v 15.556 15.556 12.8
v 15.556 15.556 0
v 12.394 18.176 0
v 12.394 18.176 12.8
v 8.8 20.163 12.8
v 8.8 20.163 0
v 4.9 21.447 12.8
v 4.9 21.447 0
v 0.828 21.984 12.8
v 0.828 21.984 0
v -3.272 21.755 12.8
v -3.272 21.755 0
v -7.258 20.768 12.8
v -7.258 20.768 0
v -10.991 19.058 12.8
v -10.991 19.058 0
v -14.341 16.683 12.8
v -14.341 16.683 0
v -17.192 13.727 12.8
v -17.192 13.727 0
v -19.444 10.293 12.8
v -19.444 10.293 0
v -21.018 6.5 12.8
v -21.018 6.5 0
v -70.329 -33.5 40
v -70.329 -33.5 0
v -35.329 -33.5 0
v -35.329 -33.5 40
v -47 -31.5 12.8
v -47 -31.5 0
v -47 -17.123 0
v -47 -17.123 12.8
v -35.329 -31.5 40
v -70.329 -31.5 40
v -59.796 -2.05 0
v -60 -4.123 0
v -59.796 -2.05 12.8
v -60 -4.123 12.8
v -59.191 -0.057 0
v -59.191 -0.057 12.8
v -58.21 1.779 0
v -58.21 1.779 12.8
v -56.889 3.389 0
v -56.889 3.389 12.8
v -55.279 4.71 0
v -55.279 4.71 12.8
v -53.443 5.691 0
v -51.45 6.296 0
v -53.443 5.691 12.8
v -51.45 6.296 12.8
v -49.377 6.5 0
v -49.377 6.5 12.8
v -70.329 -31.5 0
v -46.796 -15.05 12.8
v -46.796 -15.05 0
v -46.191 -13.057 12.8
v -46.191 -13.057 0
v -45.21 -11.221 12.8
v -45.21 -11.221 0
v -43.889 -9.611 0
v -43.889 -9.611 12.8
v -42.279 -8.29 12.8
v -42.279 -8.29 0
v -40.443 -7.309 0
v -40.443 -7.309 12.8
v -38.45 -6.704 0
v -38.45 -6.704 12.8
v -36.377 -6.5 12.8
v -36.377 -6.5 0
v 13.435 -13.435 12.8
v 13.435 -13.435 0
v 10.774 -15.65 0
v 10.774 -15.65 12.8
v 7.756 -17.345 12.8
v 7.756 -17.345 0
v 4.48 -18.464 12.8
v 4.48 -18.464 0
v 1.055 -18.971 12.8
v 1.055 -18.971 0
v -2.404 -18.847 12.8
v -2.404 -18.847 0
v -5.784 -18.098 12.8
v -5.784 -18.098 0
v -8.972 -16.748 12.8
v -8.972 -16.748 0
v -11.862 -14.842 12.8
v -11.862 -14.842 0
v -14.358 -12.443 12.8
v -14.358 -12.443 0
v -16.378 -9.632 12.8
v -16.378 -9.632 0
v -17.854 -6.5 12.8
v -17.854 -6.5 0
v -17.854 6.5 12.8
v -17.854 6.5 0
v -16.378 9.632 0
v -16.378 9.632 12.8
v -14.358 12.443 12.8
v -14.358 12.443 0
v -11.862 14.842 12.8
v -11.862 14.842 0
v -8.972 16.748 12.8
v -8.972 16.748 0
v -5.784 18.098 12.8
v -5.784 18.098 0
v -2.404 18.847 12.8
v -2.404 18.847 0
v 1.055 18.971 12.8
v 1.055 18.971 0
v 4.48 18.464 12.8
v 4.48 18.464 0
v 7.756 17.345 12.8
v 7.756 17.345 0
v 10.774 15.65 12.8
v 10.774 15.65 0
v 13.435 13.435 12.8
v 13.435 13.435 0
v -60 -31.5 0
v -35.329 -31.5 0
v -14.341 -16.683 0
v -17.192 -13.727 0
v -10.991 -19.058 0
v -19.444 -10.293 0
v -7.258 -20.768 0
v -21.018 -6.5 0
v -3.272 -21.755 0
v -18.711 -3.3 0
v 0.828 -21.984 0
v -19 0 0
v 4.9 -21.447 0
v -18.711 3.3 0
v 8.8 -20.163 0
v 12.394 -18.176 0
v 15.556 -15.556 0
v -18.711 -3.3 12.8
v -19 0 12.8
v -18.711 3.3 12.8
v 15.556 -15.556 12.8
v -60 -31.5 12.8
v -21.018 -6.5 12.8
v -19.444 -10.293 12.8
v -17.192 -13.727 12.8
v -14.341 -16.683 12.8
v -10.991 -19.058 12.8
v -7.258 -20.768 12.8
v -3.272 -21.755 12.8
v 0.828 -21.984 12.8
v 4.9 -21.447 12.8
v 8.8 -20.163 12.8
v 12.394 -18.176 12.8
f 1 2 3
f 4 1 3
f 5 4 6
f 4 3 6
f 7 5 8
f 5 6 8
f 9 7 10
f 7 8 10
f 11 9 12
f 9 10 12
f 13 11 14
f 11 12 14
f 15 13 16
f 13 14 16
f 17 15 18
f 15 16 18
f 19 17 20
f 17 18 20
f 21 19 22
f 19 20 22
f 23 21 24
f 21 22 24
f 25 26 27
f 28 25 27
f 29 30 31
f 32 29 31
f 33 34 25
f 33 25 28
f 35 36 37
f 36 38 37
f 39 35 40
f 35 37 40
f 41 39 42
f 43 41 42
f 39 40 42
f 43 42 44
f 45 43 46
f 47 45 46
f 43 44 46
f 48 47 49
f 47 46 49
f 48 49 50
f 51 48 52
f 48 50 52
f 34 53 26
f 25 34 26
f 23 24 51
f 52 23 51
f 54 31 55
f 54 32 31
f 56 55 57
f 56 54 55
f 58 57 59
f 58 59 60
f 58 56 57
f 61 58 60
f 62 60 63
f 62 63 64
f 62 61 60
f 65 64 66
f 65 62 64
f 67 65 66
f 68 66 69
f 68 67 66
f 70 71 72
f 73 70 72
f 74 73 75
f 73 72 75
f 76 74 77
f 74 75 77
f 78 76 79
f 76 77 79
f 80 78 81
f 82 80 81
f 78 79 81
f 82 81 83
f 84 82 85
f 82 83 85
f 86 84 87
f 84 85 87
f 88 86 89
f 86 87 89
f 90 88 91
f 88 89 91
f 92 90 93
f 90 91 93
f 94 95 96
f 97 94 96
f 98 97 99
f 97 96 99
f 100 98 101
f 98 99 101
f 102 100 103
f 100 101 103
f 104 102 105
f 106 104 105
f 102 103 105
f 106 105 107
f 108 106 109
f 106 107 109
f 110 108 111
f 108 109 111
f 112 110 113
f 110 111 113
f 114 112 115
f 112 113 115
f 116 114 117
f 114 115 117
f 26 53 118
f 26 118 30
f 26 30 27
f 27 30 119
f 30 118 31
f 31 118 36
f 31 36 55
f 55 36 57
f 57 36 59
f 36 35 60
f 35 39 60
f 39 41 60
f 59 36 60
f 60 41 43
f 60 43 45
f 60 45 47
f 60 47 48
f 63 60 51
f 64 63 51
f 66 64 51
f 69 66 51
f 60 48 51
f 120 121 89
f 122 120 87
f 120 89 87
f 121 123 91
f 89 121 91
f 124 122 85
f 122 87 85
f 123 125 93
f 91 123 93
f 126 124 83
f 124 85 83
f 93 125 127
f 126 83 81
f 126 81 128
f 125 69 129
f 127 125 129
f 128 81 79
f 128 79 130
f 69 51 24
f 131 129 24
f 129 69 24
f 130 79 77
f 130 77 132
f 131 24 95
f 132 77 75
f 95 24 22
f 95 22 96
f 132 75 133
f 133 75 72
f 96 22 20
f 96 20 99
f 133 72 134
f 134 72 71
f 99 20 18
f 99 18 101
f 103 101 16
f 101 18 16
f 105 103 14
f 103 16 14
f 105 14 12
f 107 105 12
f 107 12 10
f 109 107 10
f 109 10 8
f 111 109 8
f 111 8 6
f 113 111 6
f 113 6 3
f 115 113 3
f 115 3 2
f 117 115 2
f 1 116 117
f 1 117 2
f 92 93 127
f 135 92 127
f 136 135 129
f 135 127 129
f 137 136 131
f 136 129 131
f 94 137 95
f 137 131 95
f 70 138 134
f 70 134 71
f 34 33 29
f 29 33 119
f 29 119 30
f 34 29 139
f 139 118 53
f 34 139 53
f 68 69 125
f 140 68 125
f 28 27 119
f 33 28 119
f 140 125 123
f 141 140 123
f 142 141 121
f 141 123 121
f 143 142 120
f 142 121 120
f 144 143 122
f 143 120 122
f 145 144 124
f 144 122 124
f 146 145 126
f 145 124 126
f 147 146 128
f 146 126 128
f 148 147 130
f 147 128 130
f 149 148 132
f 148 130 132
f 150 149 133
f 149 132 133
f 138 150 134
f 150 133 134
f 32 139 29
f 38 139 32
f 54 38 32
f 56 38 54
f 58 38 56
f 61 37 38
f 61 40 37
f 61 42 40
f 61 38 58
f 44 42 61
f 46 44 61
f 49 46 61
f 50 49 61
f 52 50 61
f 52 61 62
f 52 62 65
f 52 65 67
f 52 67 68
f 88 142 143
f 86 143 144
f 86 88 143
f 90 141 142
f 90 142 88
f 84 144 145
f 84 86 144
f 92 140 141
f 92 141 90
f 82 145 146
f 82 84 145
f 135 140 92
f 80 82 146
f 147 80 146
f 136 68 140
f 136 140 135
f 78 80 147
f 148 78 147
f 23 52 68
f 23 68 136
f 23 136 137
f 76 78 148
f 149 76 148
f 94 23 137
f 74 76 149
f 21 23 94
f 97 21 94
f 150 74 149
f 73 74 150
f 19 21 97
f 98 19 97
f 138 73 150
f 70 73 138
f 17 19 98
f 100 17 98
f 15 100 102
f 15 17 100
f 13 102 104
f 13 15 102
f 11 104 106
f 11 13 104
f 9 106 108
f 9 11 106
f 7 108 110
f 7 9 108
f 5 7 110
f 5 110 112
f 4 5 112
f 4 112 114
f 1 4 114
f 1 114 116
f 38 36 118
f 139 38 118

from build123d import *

# Parameters (mm, degrees)
F0_W     = 13
F0_H     = 25
F1_DEPTH = 12.8
F2_DEPTH = 40
F3_R     = 10.6225396744


with BuildPart() as f1:
    # F0 (on Top) → F1 (new body)
    with BuildSketch(Plane.XY):
        with BuildLine():
            ThreePointArc((-21.017849557, -6.5), (-22, 0), (-21.017849557, 6.5))
            Line((-21.017849557, 6.5), (-60, 6.5))
            Line((-60, 6.5), (-60, -6.5))
            Line((-60, -6.5), (-47, -6.5))
            Line((-47, -6.5), (-21.017849557, -6.5))
        make_face()
        with Locations((-53.5, -19)):
            Rectangle(F0_W, F0_H)
        with BuildLine():
            ThreePointArc((-17.8535710714, -6.5), (-19, 0), (-17.8535710714, 6.5))
            Line((-17.8535710714, 6.5), (-21.017849557, 6.5))
            ThreePointArc((-21.017849557, 6.5), (-22, 0), (-21.017849557, -6.5))
            Line((-21.017849557, -6.5), (-17.8535710714, -6.5))
        make_face()
        with BuildLine():
            Line((15.5563491861, -15.5563491861), (13.4350288425, -13.4350288425))
            ThreePointArc((13.4350288425, -13.4350288425), (-4.1115125099, -18.5498103732), (-17.8535710714, -6.5))
            Line((-17.8535710714, -6.5), (-21.017849557, -6.5))
            ThreePointArc((-21.017849557, -6.5), (-5.2878503875, -21.3550611865), (15.5563491861, -15.5563491861))
        make_face()
        with BuildLine():
            ThreePointArc((-17.8535710714, 6.5), (-4.1115125099, 18.5498103732), (13.4350288425, 13.4350288425))
            Line((13.4350288425, 13.4350288425), (15.5563491861, 15.5563491861))
            ThreePointArc((15.5563491861, 15.5563491861), (-5.2878503875, 21.3550611865), (-21.017849557, 6.5))
            Line((-21.017849557, 6.5), (-17.8535710714, 6.5))
        make_face()
    extrude(amount=F1_DEPTH)

    # F0 (on Top) → F2 (join)
    with BuildSketch(Plane.XY):
        Polygon((-35.3286863863, -31.5), (-47, -31.5), (-60, -31.5), (-70.3286863863, -31.5), (-70.3286863863, -33.5), (-35.3286863863, -33.5), align=None)
    extrude(amount=F2_DEPTH)

    # F3
    f3_edges = [f1.edges().sort_by_distance(p)[0] for p in [
        (-60, 6.5, 6.4),
        (-47, -6.5, 6.4),
    ]]
    fillet(f3_edges, radius=F3_R)


solid = f1.part
